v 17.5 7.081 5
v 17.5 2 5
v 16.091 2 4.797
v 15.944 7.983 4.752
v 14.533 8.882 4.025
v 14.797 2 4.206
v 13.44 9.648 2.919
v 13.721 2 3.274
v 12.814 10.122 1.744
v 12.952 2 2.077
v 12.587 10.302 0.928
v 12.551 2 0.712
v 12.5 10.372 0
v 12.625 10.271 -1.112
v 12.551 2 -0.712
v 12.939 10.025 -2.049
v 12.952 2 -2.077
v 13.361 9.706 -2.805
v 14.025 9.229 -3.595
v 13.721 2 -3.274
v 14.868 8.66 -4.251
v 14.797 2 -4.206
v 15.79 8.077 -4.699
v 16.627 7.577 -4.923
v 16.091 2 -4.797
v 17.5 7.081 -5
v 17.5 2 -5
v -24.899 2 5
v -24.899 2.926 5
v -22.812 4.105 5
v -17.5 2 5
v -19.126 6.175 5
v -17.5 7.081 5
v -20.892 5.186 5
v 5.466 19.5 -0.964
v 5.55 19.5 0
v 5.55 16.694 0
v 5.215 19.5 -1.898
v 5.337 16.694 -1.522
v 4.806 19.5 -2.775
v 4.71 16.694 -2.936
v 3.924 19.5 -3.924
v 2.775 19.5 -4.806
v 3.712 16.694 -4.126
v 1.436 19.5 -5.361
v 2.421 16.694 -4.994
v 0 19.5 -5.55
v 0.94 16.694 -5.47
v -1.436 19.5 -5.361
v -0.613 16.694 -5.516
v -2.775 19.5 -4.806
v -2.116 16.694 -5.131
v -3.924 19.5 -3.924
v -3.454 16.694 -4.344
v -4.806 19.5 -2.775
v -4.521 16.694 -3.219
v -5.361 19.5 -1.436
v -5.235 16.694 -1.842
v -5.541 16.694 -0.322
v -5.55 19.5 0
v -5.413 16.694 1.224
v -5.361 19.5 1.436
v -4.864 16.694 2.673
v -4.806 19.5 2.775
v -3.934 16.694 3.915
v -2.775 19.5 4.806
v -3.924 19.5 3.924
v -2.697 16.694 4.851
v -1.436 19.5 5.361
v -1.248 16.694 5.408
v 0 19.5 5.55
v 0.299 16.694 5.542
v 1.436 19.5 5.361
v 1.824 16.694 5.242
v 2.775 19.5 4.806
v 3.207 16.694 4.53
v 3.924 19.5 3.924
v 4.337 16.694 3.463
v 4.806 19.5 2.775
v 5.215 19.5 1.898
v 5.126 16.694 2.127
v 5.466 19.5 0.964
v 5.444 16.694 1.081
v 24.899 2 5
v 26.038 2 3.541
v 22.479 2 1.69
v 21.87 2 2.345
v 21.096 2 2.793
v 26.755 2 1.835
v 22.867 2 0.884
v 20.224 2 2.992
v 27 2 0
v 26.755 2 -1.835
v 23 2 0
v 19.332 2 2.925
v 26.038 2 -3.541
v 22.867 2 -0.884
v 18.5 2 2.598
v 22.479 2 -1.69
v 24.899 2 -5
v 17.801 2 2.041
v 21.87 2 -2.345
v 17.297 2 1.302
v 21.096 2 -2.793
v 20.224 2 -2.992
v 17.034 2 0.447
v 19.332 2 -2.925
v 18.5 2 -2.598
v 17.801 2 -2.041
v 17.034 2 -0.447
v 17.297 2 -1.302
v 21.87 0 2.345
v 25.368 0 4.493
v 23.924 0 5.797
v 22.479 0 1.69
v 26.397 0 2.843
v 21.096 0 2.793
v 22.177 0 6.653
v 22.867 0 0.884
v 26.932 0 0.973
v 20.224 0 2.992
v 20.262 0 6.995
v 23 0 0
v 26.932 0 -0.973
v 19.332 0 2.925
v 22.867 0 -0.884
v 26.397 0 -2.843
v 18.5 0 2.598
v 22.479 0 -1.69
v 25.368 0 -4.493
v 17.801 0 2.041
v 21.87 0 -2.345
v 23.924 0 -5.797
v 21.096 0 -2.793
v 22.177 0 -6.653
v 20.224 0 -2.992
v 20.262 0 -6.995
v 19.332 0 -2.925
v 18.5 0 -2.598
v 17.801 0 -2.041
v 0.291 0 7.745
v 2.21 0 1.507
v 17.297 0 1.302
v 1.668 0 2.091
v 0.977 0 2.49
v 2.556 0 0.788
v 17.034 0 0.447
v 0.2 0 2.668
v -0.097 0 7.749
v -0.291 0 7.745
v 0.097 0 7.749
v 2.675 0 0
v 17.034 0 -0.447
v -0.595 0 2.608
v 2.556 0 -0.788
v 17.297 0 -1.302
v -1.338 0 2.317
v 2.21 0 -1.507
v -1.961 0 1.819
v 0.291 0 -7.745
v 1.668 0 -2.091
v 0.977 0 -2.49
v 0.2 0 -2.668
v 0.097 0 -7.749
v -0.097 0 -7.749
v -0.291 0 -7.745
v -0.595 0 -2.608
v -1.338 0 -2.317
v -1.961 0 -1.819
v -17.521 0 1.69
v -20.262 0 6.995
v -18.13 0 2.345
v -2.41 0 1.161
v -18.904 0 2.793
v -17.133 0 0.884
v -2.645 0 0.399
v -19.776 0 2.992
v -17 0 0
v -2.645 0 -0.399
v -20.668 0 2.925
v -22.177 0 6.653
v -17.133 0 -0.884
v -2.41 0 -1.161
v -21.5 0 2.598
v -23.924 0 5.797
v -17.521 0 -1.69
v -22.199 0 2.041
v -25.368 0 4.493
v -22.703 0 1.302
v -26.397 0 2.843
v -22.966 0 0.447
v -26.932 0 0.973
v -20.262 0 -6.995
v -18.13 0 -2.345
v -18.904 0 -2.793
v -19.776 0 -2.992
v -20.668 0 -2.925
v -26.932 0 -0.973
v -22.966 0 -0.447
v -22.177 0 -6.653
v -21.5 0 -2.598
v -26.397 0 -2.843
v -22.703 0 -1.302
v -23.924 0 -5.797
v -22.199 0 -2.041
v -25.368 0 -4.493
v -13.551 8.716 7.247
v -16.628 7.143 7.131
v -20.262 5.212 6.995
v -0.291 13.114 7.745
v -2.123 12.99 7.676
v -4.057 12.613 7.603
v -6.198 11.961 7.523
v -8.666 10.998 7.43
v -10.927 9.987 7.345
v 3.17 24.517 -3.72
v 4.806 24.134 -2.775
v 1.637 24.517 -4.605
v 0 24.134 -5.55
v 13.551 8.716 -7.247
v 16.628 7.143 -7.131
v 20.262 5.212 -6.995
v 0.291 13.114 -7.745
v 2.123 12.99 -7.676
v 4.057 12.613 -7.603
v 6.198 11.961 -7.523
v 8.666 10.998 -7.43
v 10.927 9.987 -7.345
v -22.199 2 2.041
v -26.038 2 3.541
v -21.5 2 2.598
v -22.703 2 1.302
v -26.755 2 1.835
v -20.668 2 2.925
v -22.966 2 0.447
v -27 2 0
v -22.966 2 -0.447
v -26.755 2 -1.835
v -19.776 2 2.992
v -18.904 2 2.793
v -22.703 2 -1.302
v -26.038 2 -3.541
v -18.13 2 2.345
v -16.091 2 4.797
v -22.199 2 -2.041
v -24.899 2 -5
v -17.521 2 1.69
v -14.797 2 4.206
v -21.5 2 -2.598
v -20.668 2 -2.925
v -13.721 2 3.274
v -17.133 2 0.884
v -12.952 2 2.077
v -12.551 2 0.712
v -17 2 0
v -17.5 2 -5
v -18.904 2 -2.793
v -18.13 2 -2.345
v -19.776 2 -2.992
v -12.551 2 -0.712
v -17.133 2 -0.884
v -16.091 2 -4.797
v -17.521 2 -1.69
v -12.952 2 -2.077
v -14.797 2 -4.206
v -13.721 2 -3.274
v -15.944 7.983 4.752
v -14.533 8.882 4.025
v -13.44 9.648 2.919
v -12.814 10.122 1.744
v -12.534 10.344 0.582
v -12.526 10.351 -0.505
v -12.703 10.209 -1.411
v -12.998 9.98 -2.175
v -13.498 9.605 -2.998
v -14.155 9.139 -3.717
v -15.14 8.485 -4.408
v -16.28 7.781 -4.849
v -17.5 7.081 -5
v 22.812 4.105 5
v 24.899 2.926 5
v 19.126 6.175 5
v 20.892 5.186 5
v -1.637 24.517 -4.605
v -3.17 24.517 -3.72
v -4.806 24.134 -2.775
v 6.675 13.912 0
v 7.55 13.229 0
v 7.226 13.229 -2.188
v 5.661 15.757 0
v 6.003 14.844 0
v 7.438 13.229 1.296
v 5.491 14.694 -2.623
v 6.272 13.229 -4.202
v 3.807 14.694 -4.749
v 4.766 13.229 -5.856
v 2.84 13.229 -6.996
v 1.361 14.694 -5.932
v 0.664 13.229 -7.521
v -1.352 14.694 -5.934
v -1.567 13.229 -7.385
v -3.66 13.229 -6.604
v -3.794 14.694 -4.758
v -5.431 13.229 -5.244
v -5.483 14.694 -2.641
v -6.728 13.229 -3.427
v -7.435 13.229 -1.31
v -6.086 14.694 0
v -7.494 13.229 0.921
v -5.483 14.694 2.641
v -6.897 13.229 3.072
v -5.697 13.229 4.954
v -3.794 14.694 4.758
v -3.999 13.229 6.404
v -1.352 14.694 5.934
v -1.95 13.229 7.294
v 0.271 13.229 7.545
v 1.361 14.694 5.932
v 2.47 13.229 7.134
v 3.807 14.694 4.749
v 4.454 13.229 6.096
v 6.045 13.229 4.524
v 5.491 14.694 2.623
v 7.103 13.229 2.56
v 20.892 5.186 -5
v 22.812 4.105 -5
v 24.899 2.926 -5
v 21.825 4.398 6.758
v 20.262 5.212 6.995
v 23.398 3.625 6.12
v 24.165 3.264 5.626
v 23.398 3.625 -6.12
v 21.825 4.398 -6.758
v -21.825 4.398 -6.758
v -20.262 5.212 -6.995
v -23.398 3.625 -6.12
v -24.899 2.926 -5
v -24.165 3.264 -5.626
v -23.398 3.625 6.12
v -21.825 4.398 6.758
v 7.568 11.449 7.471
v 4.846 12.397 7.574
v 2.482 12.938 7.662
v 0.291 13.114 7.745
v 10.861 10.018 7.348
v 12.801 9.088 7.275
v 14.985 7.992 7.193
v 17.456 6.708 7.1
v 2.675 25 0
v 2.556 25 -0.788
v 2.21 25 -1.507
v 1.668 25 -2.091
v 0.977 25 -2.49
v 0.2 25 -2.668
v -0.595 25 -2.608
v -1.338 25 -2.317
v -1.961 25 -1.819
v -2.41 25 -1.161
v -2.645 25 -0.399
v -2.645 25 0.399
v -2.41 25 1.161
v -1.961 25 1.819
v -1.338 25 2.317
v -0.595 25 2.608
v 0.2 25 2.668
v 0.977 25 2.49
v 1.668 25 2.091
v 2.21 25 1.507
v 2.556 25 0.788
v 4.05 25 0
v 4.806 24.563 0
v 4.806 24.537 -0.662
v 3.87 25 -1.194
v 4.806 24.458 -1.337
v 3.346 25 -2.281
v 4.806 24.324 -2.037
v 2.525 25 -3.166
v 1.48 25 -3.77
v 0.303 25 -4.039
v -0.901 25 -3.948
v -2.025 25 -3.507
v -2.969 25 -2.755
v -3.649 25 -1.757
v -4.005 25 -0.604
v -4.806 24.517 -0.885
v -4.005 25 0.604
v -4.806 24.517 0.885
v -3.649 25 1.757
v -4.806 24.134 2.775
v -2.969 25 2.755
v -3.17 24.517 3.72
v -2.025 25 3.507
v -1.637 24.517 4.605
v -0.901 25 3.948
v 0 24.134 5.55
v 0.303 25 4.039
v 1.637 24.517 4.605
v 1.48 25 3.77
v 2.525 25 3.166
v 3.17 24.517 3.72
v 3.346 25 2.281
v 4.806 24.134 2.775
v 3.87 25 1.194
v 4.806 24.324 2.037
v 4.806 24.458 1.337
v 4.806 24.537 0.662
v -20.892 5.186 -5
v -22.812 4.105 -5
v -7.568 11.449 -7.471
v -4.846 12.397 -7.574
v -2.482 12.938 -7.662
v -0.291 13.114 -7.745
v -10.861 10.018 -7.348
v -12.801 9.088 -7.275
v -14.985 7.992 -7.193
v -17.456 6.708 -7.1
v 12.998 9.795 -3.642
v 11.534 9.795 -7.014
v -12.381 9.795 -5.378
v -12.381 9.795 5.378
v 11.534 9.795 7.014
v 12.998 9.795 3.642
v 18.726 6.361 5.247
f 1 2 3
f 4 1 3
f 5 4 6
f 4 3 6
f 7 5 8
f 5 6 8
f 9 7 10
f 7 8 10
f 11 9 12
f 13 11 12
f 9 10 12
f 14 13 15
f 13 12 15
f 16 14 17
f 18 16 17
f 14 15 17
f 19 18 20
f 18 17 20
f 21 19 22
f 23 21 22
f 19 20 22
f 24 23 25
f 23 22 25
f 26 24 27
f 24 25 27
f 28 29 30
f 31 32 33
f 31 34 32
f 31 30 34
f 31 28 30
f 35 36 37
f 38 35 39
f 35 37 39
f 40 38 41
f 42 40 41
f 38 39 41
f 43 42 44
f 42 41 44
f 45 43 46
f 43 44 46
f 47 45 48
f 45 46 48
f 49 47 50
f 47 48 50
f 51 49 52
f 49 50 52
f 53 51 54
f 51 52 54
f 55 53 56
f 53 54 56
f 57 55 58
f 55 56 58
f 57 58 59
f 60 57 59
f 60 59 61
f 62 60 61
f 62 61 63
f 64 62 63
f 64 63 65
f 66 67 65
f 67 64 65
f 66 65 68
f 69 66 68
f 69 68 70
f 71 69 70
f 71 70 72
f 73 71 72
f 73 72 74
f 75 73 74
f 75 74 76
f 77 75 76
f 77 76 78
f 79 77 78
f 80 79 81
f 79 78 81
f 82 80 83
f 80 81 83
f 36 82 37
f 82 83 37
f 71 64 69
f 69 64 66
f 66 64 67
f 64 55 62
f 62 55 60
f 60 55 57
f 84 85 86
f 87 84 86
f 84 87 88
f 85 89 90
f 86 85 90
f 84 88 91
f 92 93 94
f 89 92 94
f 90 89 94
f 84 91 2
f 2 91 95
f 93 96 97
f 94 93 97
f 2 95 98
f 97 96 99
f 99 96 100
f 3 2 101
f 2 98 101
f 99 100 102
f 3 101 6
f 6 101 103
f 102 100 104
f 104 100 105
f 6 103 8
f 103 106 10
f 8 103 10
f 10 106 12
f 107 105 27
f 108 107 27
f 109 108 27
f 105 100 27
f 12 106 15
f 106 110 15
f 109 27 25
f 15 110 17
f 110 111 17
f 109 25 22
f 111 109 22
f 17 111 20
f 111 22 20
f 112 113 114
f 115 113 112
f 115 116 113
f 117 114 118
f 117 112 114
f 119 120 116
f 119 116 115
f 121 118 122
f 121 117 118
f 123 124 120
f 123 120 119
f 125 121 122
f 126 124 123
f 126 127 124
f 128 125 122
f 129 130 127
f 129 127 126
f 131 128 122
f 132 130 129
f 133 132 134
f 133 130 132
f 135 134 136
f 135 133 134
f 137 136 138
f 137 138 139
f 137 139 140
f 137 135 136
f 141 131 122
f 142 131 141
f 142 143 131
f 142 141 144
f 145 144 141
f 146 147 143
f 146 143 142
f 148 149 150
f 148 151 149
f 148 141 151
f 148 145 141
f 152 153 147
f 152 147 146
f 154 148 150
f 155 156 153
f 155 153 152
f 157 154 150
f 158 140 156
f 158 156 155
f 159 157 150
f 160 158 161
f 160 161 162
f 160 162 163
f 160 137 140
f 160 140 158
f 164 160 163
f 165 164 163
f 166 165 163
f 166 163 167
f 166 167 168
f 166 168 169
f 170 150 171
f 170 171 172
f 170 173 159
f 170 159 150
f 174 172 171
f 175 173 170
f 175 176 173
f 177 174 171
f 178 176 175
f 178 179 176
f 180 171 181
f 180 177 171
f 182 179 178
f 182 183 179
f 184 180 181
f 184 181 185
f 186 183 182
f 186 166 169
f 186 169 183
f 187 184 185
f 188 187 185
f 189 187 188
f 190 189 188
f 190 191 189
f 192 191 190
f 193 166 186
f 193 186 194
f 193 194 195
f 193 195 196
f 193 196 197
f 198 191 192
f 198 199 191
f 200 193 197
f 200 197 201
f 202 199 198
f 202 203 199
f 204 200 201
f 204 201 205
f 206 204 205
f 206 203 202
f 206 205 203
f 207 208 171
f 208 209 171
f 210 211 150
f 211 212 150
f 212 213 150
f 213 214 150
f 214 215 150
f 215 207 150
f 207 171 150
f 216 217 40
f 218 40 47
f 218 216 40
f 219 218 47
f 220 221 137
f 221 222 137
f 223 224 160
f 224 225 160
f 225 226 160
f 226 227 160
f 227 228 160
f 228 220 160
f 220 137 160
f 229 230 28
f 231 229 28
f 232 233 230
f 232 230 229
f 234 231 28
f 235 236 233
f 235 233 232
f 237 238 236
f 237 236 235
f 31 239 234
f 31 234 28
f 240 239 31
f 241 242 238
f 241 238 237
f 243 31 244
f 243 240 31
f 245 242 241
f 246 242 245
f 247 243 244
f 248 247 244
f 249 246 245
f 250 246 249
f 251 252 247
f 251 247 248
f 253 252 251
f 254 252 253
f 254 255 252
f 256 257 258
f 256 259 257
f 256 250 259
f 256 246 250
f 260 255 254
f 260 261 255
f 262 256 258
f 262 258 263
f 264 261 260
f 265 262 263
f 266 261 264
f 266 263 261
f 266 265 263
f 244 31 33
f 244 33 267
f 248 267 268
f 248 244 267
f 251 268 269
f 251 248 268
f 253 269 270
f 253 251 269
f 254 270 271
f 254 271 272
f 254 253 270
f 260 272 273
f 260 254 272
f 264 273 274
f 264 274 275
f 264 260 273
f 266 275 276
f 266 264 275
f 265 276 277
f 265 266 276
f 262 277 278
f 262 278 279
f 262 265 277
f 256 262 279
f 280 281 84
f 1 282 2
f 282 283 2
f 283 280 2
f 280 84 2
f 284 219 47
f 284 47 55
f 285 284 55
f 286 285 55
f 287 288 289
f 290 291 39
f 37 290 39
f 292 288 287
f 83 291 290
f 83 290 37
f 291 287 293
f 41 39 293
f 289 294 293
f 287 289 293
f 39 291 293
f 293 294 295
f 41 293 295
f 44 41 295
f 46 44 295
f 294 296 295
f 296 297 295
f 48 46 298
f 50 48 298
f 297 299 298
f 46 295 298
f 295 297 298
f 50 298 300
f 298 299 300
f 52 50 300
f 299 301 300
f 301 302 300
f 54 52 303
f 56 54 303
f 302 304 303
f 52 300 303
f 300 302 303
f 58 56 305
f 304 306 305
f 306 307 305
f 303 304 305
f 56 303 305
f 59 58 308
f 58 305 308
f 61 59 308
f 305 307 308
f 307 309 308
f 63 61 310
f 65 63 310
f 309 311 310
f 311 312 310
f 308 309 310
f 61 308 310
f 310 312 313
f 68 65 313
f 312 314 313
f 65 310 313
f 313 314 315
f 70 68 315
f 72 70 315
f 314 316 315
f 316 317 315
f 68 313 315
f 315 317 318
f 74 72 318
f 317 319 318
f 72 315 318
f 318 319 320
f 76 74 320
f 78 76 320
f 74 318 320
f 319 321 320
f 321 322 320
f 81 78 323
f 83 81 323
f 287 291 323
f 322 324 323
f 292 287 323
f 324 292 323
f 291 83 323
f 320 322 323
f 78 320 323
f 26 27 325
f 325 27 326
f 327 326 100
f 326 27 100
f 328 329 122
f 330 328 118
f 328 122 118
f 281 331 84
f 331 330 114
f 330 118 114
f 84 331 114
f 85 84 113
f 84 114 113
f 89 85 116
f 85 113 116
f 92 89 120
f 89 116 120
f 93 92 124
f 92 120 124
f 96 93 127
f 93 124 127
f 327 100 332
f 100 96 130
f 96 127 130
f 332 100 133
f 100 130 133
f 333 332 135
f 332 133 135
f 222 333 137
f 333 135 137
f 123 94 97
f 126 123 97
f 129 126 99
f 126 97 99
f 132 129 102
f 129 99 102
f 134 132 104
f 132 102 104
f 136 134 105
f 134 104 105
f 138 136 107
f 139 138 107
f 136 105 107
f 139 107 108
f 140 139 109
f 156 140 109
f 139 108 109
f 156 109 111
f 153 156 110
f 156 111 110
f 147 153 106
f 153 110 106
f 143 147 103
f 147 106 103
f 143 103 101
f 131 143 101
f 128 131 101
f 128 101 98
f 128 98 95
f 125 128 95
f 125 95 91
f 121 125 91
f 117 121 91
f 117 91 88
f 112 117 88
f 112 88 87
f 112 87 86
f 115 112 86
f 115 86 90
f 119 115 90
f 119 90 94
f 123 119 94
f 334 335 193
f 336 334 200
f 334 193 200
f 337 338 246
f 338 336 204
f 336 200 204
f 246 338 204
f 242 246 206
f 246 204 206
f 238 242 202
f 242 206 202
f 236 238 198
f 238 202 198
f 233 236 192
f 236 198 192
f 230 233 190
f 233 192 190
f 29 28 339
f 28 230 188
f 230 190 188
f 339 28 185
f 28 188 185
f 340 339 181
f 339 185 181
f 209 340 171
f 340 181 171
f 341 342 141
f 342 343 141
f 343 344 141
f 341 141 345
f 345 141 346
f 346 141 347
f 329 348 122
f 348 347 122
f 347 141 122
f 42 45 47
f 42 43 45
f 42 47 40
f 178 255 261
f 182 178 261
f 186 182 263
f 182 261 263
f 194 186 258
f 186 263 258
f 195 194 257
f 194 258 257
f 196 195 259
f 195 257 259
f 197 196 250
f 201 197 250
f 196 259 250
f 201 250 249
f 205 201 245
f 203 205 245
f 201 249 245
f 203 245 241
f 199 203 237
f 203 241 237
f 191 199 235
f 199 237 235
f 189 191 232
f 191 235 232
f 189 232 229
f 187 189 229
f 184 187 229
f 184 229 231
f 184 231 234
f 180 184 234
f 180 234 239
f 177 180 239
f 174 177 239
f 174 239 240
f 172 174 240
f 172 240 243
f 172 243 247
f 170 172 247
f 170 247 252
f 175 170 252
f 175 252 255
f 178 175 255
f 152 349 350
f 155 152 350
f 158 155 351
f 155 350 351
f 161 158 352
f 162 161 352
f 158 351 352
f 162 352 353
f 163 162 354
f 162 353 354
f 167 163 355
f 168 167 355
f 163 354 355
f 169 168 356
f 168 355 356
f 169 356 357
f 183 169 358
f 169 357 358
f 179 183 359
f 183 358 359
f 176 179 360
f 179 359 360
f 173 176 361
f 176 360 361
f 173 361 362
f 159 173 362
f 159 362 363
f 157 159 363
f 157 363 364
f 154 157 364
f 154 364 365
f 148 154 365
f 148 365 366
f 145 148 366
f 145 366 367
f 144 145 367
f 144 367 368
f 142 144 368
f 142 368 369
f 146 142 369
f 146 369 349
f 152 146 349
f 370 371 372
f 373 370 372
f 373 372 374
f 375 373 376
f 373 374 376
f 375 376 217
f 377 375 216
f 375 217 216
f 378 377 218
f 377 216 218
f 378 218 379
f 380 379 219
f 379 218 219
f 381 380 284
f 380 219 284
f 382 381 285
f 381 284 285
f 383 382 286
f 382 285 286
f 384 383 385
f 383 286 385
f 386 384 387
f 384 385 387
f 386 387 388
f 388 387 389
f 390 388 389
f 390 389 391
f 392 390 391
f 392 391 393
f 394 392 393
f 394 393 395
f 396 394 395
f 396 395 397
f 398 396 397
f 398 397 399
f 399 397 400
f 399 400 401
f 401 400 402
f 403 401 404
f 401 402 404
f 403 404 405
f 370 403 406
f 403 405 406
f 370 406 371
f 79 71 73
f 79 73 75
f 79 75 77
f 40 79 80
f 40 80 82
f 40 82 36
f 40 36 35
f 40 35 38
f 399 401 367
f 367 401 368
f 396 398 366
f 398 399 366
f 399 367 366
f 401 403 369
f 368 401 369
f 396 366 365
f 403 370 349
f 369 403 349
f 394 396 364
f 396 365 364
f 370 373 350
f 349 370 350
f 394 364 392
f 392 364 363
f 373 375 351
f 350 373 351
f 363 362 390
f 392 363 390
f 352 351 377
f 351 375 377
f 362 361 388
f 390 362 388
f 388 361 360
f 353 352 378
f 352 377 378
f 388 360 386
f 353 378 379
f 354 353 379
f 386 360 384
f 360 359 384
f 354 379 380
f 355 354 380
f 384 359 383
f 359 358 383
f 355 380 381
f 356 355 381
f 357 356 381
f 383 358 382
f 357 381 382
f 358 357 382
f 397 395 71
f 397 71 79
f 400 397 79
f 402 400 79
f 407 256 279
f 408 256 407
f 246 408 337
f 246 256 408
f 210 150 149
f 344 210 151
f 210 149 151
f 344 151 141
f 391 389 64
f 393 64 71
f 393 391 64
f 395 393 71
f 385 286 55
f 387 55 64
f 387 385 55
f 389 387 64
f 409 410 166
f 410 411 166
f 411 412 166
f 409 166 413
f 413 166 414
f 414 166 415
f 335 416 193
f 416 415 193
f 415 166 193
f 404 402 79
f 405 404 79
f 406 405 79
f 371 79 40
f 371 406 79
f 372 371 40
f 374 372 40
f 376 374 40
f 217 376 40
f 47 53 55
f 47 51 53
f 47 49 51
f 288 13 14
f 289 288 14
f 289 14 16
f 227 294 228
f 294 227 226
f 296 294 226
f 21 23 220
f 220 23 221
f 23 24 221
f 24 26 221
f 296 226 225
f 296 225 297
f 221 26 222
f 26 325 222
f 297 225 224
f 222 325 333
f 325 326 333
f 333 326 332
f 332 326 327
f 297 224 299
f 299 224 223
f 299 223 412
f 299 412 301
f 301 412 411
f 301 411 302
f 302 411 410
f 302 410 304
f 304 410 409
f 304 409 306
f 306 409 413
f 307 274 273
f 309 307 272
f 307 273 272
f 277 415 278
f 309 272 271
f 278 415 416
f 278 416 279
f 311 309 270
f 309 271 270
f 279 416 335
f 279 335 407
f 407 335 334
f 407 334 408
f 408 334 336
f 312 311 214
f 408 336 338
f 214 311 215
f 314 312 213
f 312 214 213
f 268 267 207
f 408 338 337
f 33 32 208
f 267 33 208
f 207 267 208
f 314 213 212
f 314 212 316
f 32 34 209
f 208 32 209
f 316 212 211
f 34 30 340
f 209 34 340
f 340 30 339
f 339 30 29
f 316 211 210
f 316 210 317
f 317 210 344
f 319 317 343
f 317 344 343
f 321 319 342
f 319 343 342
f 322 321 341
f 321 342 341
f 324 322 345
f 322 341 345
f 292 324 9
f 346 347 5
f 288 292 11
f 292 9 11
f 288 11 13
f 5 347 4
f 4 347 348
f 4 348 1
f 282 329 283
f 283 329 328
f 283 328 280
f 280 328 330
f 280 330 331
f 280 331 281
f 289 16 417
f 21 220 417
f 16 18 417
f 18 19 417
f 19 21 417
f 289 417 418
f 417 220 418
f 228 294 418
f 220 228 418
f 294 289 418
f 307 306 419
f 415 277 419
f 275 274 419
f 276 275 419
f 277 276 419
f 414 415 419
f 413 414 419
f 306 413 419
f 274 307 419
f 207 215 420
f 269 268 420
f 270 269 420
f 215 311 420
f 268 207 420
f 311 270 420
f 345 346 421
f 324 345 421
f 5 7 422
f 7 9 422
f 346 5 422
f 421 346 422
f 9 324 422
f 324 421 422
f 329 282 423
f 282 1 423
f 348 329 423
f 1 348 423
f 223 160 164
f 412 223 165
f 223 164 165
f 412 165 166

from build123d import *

# Parameters (mm, degrees)
SZKIC1_W                        = 27
SZKIC1_H                        = 25
ZAOKR_GLENIE1_R                 = 4
SZKIC4_R                        = 3
WYTNIJ_WYCI_GNI_CIE3_DEPTH      = 24.0000001
WYTNIJ_WYCI_GNI_CIE3_DEPTH_BACK = 3
WYTNIJ_WYCI_GNI_CIE2_DEPTH      = 24.0000001
SZKIC5_OUTSIDE_W                = 72.072
SZKIC5_OUTSIDE_H                = 72.072
WYTNIJ_WYCI_GNI_CIE4_DEPTH      = 26.0000001
SZKIC6_R                        = 2.675
WYTNIJ_WYCI_GNI_CIE5_DEPTH      = 26.0000001
SZKIC7_OUTSIDE_W                = 68.298
SZKIC7_OUTSIDE_H                = 29.798
WYTNIJ_WYCI_GNI_CIE6_DEPTH      = 5.5


with BuildPart() as part:
    # Szkic1 → Obrót1 (revolve)
    with BuildSketch(Plane.XY):
        with Locations((13.5, 12.5)):
            Rectangle(SZKIC1_W, SZKIC1_H)
    revolve(axis=Axis((0, 0, 0), (0, 1, 0)))

    # Szkic2 → Wycięcie-obrót1 (revolve, cut)
    with BuildSketch(Plane.XY):
        Polygon((5.55, 25), (5.55, 14.384163274), (27, 2), (27, 25), align=None)
    revolve(axis=Axis((0, 0, 0), (0, 1, 0)), mode=Mode.SUBTRACT)

    # Zaokrąglenie1
    zaokr_glenie1_edges = [part.edges().sort_by_distance(p)[0] for p in [
        (-5.55, 14.384163274, 0),
    ]]
    fillet(zaokr_glenie1_edges, radius=ZAOKR_GLENIE1_R)

    # Szkic4 → Wytnij-wyciągnięcie3 (cut, two sides)
    with BuildSketch(Plane(origin=(0, 2, 0), x_dir=(1, 0, 0), z_dir=(0, 1, 0))) as wytnij_wyci_gni_cie3_sk:
        with Locations((-20, 0)):
            Circle(SZKIC4_R)
        with Locations((20, 0)):
            Circle(SZKIC4_R)
    extrude(amount=WYTNIJ_WYCI_GNI_CIE3_DEPTH, mode=Mode.SUBTRACT)
    extrude(wytnij_wyci_gni_cie3_sk.sketch, amount=-WYTNIJ_WYCI_GNI_CIE3_DEPTH_BACK, mode=Mode.SUBTRACT)

    # Szkic3 → Wytnij-wyciągnięcie2 (cut, through all)
    with BuildSketch(Plane(origin=(0, 2, 0), x_dir=(1, 0, 0), z_dir=(0, 1, 0))):
        with BuildLine():
            Line((-17.5, 5), (-26.532998323, 5))
            ThreePointArc((-26.532998323, 5), (-27, 0), (-26.532998323, -5))
            Line((-26.532998323, -5), (-17.5, -5))
            ThreePointArc((-17.5, -5), (-12.5, 0), (-17.5, 5))
        make_face()
        with BuildLine():
            Line((17.5, 5), (26.532998323, 5))
            ThreePointArc((26.532998323, 5), (27, 0), (26.532998323, -5))
            Line((26.532998323, -5), (17.5, -5))
            ThreePointArc((17.5, -5), (12.5, 0), (17.5, 5))
        make_face()
    extrude(amount=WYTNIJ_WYCI_GNI_CIE2_DEPTH, mode=Mode.SUBTRACT)

    # Szkic5 outside → Wytnij-wyciągnięcie4 (cut, through all)
    with BuildSketch(Plane.XZ):
        Rectangle(SZKIC5_OUTSIDE_W, SZKIC5_OUTSIDE_H)
        with BuildLine():
            Line((-20.2625, 6.995076393), (-0.290625, 7.744548864))
            ThreePointArc((-0.290625, 7.744548864), (0, 7.75), (0.290625, 7.744548864))
            Line((0.290625, 7.744548864), (20.2625, 6.995076393))
            ThreePointArc((20.2625, 6.995076393), (27, 0), (20.2625, -6.995076393))
            Line((20.2625, -6.995076393), (0.290625, -7.744548864))
            ThreePointArc((0.290625, -7.744548864), (0, -7.75), (-0.290625, -7.744548864))
            Line((-0.290625, -7.744548864), (-20.2625, -6.995076393))
            ThreePointArc((-20.2625, -6.995076393), (-27, 0), (-20.2625, 6.995076393))
        make_face(mode=Mode.SUBTRACT)
    extrude(amount=-WYTNIJ_WYCI_GNI_CIE4_DEPTH, mode=Mode.SUBTRACT)

    # Szkic6 → Wytnij-wyciągnięcie5 (cut, through all)
    with BuildSketch(Plane(origin=(0, 25, 0), x_dir=(1, 0, 0), z_dir=(0, 1, 0))):
        Circle(SZKIC6_R)
    extrude(amount=-WYTNIJ_WYCI_GNI_CIE5_DEPTH, mode=Mode.SUBTRACT)

    # Szkic7 outside → Wytnij-wyciągnięcie6 (cut)
    with BuildSketch(Plane(origin=(0, 25, 0), x_dir=(1, 0, 0), z_dir=(0, 1, 0))):
        Rectangle(SZKIC7_OUTSIDE_W, SZKIC7_OUTSIDE_H)
        Polygon((-4.806440991, 2.775), (-4.806440991, -2.775), (0, -5.55), (4.806440991, -2.775), (4.806440991, 2.775), (0, 5.55), align=None, mode=Mode.SUBTRACT)
    extrude(amount=-WYTNIJ_WYCI_GNI_CIE6_DEPTH, mode=Mode.SUBTRACT)

    # Szkic9 → Wycięcie-obrót2 (revolve, cut)
    with BuildSketch(Plane.XY):
        Polygon((4.05, 25), (5.55, 24.133974596), (5.55, 25), align=None)
    revolve(axis=Axis((0, 19.5, 0), (0, 1, 0)), mode=Mode.SUBTRACT)


solid = part.part
